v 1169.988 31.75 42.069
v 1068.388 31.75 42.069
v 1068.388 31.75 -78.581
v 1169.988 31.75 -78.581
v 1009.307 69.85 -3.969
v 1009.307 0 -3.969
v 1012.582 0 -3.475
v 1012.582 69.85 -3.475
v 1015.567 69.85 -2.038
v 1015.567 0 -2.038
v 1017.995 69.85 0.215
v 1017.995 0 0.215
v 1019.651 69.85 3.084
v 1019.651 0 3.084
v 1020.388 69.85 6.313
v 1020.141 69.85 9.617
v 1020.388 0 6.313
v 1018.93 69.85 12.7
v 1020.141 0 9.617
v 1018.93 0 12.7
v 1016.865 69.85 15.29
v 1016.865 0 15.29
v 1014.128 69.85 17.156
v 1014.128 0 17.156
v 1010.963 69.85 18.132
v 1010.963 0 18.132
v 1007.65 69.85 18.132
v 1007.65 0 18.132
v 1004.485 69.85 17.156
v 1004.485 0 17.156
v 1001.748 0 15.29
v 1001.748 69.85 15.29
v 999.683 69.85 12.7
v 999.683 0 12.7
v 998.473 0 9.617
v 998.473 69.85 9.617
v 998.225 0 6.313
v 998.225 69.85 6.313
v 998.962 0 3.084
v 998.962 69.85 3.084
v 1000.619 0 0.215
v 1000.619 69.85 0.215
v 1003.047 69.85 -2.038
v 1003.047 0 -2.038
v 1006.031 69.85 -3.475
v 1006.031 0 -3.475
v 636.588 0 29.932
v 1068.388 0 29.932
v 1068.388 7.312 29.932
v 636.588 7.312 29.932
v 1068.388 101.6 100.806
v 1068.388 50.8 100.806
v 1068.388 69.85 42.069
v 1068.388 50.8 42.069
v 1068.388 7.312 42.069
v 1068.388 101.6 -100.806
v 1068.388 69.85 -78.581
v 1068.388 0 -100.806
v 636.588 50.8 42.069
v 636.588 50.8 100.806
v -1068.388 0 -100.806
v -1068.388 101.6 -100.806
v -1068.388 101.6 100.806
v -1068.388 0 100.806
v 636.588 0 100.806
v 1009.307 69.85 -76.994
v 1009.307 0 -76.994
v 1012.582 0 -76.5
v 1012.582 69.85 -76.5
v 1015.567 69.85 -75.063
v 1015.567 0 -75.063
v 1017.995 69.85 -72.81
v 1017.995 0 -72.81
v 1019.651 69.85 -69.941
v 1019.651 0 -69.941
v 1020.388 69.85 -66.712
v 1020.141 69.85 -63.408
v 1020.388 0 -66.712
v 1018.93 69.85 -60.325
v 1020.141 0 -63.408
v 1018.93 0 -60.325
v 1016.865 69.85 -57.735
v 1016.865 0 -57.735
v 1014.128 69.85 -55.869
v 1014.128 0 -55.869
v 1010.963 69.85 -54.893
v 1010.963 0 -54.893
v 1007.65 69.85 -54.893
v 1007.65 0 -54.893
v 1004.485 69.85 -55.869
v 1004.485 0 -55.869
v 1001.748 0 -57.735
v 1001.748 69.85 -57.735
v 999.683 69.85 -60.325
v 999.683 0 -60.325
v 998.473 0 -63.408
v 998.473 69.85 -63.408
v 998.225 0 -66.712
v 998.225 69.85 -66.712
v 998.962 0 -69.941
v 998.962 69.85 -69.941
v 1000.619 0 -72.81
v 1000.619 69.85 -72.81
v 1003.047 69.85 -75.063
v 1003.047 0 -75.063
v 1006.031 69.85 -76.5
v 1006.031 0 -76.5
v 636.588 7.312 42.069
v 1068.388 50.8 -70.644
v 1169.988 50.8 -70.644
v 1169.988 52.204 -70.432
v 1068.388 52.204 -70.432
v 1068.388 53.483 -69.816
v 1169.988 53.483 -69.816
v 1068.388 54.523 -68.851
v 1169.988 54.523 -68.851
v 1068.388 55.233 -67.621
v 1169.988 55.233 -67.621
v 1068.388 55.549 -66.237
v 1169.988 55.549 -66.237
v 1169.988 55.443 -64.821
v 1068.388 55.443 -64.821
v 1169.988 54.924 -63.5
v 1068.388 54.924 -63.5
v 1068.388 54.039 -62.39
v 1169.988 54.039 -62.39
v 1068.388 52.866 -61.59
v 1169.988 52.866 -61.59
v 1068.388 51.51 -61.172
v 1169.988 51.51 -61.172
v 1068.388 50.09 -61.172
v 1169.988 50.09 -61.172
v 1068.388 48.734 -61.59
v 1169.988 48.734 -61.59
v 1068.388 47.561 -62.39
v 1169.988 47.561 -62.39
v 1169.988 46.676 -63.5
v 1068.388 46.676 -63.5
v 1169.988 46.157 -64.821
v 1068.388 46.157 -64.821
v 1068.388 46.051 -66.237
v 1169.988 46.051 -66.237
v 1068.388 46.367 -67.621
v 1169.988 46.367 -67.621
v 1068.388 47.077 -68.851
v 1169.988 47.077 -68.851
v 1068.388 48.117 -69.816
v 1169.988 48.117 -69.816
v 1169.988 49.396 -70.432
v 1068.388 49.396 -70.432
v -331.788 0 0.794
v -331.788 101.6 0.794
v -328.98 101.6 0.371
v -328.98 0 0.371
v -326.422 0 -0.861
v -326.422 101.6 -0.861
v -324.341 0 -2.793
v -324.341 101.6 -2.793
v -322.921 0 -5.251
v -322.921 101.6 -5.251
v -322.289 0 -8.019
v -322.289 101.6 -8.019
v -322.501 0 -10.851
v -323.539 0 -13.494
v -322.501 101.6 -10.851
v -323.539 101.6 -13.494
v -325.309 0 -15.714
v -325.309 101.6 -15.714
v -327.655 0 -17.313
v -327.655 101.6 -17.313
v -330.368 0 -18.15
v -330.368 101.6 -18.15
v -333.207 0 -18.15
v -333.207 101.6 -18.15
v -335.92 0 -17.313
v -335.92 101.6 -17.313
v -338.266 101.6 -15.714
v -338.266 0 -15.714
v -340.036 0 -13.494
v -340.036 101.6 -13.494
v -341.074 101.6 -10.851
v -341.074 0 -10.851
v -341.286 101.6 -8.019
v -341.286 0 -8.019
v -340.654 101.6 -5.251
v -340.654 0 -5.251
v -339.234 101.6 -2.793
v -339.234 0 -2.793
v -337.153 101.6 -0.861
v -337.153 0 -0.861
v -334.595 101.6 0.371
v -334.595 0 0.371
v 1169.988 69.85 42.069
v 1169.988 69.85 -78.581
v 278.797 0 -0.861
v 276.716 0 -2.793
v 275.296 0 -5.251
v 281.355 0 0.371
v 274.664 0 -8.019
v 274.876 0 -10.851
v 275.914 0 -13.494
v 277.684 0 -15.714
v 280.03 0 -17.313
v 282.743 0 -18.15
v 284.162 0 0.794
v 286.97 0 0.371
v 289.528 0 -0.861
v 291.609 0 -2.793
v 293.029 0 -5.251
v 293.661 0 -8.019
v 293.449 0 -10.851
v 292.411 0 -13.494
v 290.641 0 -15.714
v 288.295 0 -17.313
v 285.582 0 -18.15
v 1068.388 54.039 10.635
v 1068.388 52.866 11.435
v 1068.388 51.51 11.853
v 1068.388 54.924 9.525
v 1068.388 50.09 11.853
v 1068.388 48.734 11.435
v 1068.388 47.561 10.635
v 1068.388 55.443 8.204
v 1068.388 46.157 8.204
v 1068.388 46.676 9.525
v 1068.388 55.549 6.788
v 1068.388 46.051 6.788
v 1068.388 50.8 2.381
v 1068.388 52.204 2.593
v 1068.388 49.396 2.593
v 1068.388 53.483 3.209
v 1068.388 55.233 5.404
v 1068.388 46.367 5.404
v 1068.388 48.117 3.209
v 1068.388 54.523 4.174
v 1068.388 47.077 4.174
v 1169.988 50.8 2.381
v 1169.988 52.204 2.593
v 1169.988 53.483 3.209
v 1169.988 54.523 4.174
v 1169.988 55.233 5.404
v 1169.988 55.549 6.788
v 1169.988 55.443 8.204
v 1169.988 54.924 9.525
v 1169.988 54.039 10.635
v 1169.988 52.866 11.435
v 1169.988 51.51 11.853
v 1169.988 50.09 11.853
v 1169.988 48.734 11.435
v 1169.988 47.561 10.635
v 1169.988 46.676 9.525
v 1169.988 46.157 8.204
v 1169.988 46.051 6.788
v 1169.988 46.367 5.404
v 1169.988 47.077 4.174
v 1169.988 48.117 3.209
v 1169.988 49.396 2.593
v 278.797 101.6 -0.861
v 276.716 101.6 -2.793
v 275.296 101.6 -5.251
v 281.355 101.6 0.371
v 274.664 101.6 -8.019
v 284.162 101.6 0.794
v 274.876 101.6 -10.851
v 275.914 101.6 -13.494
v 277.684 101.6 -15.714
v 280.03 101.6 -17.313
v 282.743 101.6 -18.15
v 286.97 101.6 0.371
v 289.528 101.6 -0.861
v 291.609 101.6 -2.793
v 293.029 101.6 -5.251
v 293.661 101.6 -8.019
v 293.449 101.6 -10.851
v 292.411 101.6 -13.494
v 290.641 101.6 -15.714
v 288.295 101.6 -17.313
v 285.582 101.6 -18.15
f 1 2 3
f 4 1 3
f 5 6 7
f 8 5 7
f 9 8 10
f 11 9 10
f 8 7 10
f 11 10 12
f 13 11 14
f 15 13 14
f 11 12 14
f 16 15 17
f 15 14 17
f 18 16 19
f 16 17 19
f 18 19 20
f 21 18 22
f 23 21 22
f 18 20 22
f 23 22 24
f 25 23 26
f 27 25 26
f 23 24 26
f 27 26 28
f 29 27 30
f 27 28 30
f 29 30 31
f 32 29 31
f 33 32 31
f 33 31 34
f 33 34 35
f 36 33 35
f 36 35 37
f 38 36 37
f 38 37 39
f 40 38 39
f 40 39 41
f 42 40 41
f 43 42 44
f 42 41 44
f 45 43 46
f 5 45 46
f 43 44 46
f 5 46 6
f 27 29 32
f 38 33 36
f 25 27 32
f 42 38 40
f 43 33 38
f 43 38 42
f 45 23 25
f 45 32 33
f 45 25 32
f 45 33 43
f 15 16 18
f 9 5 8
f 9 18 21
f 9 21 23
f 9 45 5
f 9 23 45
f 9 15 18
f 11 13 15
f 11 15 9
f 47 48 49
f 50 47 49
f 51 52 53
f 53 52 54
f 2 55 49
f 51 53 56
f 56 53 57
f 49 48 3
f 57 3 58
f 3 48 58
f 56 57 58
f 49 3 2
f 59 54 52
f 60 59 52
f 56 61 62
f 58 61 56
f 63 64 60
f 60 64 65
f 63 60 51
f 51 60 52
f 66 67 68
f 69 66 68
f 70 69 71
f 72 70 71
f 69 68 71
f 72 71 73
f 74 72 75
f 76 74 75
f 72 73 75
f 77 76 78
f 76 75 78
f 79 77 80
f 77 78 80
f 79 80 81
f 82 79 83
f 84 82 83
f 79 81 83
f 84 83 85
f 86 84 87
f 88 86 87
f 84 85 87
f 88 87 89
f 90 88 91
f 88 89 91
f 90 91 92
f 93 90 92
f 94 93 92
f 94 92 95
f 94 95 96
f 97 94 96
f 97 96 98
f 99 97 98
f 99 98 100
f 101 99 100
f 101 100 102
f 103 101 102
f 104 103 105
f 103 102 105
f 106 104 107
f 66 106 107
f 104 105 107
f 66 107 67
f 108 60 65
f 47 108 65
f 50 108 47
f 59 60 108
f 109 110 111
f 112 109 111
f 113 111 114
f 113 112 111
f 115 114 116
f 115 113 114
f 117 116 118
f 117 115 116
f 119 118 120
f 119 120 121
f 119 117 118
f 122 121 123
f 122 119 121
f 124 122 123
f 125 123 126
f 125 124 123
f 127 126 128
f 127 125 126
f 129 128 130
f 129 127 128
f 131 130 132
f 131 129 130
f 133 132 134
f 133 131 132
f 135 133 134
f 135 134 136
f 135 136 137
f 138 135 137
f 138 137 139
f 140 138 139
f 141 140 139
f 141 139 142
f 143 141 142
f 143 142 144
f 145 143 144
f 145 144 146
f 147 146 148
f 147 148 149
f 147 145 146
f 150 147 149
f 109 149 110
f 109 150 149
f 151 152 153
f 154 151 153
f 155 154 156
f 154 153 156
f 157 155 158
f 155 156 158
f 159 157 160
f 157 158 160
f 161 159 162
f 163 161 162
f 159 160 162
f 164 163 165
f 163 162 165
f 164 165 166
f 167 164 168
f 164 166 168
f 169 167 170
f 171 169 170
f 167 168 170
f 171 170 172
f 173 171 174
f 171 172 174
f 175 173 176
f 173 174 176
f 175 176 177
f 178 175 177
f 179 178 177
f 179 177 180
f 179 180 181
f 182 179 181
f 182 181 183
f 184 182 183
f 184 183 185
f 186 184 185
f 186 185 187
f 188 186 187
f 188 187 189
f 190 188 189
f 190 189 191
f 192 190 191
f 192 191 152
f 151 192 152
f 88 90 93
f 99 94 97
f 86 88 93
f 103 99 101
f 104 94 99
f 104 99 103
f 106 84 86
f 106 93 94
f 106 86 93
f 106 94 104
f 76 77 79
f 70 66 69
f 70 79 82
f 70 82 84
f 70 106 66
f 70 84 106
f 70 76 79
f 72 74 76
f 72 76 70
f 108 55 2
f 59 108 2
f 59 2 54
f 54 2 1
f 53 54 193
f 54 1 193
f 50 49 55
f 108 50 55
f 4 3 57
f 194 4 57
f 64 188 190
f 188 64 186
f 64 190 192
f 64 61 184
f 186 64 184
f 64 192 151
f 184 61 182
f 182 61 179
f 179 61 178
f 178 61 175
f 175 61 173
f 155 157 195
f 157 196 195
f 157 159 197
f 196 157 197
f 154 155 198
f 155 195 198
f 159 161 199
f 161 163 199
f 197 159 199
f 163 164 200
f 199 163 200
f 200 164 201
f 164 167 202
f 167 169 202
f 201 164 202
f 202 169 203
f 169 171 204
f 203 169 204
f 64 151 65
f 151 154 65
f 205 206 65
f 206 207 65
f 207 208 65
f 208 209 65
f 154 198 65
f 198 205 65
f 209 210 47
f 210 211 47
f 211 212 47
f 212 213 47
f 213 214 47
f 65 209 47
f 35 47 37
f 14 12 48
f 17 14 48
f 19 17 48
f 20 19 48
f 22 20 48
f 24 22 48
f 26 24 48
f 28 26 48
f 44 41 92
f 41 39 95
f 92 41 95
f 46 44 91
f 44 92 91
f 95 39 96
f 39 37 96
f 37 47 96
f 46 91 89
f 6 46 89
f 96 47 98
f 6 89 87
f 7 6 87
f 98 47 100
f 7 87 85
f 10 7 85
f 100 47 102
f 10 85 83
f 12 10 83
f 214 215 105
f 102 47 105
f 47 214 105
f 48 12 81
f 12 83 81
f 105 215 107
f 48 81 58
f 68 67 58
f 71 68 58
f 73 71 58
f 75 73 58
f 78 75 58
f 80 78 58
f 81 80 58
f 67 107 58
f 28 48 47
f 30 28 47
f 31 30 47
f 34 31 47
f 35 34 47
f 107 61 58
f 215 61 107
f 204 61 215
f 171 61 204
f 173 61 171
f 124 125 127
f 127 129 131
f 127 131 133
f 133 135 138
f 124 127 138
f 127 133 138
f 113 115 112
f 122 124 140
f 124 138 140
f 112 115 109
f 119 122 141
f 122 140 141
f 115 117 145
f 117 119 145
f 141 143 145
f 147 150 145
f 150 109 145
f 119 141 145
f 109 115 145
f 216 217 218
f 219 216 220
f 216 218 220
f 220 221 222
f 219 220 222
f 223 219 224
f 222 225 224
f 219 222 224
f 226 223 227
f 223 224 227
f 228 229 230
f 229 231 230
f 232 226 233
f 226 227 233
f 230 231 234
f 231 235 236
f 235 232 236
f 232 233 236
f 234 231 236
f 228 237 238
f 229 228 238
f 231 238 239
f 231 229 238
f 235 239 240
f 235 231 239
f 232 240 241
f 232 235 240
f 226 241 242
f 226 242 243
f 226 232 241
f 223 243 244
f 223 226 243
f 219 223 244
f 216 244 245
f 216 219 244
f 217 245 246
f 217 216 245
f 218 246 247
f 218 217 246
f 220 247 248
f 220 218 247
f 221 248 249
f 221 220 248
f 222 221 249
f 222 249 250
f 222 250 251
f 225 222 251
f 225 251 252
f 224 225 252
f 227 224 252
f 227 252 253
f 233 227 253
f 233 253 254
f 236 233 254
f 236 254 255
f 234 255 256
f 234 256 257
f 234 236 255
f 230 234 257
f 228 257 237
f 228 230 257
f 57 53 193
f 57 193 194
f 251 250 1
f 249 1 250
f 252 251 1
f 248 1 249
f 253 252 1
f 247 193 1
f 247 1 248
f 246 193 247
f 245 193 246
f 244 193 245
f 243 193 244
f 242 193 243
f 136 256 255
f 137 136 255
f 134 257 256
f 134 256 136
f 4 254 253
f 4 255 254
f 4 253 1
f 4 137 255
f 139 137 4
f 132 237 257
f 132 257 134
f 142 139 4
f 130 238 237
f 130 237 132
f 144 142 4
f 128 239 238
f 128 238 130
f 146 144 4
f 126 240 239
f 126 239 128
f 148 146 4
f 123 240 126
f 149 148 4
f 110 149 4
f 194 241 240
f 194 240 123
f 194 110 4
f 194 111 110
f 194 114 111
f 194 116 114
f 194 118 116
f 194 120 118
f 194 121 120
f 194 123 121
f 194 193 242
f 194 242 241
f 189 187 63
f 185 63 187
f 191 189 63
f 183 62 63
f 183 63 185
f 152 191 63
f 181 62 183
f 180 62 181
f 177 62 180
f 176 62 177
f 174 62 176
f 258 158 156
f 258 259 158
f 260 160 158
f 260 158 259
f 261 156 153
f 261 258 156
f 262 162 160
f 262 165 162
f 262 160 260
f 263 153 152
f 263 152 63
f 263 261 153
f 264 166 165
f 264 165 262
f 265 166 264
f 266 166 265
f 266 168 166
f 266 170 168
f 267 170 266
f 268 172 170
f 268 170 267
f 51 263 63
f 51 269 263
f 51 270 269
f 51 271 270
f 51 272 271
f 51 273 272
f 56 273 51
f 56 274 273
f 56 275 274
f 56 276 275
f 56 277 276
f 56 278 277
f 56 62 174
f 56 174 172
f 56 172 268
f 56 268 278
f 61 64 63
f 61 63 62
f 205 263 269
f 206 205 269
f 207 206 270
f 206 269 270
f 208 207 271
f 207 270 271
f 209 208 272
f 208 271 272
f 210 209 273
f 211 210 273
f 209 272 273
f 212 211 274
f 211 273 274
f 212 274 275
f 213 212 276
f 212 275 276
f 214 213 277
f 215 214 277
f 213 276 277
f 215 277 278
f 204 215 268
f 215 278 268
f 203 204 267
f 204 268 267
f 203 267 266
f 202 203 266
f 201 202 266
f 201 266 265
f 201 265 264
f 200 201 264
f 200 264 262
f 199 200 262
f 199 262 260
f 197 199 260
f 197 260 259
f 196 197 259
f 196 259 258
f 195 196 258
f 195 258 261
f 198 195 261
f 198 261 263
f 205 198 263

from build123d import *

# Parameters (mm, degrees)
SKETCH1_W           = 2136.775
SKETCH1_H           = 201.6125
BOSS_EXTRUDE1_DEPTH = 101.6
SKETCH2_R           = 9.525
CUT_EXTRUDE1_DEPTH  = 1078.931496059
SKETCH3_R           = 4.7625
BOSS_EXTRUDE2_DEPTH = 101.6
CUT_EXTRUDE2_DEPTH  = 431.8
SKETCH5_R           = 11.1125
CUT_EXTRUDE3_DEPTH  = 69.85


with BuildPart() as part:
    # Sketch1 → Boss-Extrude1 (new body)
    with BuildSketch(Plane(origin=(0, 0, 0), x_dir=(1, 0, 0), z_dir=(0, 1, 0))):
        Rectangle(SKETCH1_W, SKETCH1_H)
    extrude(amount=BOSS_EXTRUDE1_DEPTH)

    # Sketch2 → Cut-Extrude1 (cut, through all)
    with BuildSketch(Plane(origin=(0, 101.6, 0), x_dir=(1, 0, 0), z_dir=(0, 1, 0))):
        with Locations((-331.7875, 8.73125)):
            Circle(SKETCH2_R)
        with Locations((284.1625, 8.73125)):
            Circle(SKETCH2_R)
    extrude(amount=-CUT_EXTRUDE1_DEPTH, mode=Mode.SUBTRACT)

    # Sketch3 → Boss-Extrude2 (add)
    with BuildSketch(Plane(origin=(1068.3875, 0, 0), x_dir=(0, 0, -1), z_dir=(1, 0, 0))):
        Polygon((78.58125, 69.85), (-42.06875, 69.85), (-42.06875, 50.8), (-42.06875, 31.75), (78.58125, 31.75), align=None)
        with Locations((-7.14375, 50.8)):
            Circle(SKETCH3_R, mode=Mode.SUBTRACT)
        with Locations((65.88125, 50.8)):
            Circle(SKETCH3_R, mode=Mode.SUBTRACT)
    extrude(amount=BOSS_EXTRUDE2_DEPTH)

    # Sketch3<3> → Cut-Extrude2 (cut)
    with BuildSketch(Plane(origin=(1068.3875, 0, 0), x_dir=(0, 0, -1), z_dir=(1, 0, 0))):
        Polygon((-42.06875, 31.75), (-42.06875, 50.8), (-100.80625, 50.8), (-100.80625, 0), (-29.932015023, 0), (-29.932015023, 7.312255735), (-42.06875, 7.312255735), align=None)
    extrude(amount=-CUT_EXTRUDE2_DEPTH, mode=Mode.SUBTRACT)

    # Sketch5 → Cut-Extrude3 (cut)
    with BuildSketch(Plane.XZ):
        with Locations((1009.306684953, 7.14375)):
            Circle(SKETCH5_R)
        with Locations((1009.306684953, -65.88125)):
            Circle(SKETCH5_R)
    extrude(amount=-CUT_EXTRUDE3_DEPTH, mode=Mode.SUBTRACT)


solid = part.part
